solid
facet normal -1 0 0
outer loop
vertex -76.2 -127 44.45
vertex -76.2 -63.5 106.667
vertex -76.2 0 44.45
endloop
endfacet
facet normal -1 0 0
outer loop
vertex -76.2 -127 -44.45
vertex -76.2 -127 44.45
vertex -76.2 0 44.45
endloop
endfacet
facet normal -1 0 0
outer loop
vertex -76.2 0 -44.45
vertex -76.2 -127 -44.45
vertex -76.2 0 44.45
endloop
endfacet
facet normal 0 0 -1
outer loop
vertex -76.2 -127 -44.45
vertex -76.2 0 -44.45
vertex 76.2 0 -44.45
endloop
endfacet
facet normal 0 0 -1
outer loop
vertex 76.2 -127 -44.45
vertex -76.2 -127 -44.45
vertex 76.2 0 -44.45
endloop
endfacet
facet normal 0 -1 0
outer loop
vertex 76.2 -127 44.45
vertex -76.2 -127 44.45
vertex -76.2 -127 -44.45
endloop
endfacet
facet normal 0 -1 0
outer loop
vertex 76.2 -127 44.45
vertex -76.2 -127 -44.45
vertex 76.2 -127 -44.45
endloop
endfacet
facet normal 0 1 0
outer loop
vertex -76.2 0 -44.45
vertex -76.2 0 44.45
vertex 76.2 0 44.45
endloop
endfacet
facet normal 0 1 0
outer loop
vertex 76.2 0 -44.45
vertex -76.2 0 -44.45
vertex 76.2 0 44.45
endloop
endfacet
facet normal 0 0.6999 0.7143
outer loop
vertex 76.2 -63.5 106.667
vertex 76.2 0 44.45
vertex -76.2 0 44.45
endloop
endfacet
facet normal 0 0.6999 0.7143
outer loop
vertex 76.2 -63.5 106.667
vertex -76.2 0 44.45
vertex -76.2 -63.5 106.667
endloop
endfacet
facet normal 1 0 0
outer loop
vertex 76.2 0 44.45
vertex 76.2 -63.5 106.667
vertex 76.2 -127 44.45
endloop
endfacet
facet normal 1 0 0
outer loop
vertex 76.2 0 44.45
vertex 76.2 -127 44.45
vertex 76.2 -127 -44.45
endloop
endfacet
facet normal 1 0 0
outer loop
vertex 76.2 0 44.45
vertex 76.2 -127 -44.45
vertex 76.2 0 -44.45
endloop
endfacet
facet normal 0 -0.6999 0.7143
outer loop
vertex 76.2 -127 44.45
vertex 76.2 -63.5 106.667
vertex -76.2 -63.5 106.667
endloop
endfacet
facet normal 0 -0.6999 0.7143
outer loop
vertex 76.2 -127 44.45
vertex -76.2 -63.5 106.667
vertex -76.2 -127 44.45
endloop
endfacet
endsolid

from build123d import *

# Parameters (mm, degrees)
F0_W     = 152.4
F0_H     = 88.9
F1_DEPTH = 127
F3_DEPTH = 152.4


with BuildPart() as f1:
    # F0 (on Front) → F1 (new body)
    with BuildSketch(Plane.XZ):
        Rectangle(F0_W, F0_H)
    extrude(amount=F1_DEPTH)

    # F2 (on face) → F3 (join)
    with BuildSketch(Plane.YZ.offset(76.2)):
        Polygon((-63.5, 106.667039), (-127, 44.45), (0, 44.45), align=None)
    extrude(amount=-F3_DEPTH)


solid = f1.part
